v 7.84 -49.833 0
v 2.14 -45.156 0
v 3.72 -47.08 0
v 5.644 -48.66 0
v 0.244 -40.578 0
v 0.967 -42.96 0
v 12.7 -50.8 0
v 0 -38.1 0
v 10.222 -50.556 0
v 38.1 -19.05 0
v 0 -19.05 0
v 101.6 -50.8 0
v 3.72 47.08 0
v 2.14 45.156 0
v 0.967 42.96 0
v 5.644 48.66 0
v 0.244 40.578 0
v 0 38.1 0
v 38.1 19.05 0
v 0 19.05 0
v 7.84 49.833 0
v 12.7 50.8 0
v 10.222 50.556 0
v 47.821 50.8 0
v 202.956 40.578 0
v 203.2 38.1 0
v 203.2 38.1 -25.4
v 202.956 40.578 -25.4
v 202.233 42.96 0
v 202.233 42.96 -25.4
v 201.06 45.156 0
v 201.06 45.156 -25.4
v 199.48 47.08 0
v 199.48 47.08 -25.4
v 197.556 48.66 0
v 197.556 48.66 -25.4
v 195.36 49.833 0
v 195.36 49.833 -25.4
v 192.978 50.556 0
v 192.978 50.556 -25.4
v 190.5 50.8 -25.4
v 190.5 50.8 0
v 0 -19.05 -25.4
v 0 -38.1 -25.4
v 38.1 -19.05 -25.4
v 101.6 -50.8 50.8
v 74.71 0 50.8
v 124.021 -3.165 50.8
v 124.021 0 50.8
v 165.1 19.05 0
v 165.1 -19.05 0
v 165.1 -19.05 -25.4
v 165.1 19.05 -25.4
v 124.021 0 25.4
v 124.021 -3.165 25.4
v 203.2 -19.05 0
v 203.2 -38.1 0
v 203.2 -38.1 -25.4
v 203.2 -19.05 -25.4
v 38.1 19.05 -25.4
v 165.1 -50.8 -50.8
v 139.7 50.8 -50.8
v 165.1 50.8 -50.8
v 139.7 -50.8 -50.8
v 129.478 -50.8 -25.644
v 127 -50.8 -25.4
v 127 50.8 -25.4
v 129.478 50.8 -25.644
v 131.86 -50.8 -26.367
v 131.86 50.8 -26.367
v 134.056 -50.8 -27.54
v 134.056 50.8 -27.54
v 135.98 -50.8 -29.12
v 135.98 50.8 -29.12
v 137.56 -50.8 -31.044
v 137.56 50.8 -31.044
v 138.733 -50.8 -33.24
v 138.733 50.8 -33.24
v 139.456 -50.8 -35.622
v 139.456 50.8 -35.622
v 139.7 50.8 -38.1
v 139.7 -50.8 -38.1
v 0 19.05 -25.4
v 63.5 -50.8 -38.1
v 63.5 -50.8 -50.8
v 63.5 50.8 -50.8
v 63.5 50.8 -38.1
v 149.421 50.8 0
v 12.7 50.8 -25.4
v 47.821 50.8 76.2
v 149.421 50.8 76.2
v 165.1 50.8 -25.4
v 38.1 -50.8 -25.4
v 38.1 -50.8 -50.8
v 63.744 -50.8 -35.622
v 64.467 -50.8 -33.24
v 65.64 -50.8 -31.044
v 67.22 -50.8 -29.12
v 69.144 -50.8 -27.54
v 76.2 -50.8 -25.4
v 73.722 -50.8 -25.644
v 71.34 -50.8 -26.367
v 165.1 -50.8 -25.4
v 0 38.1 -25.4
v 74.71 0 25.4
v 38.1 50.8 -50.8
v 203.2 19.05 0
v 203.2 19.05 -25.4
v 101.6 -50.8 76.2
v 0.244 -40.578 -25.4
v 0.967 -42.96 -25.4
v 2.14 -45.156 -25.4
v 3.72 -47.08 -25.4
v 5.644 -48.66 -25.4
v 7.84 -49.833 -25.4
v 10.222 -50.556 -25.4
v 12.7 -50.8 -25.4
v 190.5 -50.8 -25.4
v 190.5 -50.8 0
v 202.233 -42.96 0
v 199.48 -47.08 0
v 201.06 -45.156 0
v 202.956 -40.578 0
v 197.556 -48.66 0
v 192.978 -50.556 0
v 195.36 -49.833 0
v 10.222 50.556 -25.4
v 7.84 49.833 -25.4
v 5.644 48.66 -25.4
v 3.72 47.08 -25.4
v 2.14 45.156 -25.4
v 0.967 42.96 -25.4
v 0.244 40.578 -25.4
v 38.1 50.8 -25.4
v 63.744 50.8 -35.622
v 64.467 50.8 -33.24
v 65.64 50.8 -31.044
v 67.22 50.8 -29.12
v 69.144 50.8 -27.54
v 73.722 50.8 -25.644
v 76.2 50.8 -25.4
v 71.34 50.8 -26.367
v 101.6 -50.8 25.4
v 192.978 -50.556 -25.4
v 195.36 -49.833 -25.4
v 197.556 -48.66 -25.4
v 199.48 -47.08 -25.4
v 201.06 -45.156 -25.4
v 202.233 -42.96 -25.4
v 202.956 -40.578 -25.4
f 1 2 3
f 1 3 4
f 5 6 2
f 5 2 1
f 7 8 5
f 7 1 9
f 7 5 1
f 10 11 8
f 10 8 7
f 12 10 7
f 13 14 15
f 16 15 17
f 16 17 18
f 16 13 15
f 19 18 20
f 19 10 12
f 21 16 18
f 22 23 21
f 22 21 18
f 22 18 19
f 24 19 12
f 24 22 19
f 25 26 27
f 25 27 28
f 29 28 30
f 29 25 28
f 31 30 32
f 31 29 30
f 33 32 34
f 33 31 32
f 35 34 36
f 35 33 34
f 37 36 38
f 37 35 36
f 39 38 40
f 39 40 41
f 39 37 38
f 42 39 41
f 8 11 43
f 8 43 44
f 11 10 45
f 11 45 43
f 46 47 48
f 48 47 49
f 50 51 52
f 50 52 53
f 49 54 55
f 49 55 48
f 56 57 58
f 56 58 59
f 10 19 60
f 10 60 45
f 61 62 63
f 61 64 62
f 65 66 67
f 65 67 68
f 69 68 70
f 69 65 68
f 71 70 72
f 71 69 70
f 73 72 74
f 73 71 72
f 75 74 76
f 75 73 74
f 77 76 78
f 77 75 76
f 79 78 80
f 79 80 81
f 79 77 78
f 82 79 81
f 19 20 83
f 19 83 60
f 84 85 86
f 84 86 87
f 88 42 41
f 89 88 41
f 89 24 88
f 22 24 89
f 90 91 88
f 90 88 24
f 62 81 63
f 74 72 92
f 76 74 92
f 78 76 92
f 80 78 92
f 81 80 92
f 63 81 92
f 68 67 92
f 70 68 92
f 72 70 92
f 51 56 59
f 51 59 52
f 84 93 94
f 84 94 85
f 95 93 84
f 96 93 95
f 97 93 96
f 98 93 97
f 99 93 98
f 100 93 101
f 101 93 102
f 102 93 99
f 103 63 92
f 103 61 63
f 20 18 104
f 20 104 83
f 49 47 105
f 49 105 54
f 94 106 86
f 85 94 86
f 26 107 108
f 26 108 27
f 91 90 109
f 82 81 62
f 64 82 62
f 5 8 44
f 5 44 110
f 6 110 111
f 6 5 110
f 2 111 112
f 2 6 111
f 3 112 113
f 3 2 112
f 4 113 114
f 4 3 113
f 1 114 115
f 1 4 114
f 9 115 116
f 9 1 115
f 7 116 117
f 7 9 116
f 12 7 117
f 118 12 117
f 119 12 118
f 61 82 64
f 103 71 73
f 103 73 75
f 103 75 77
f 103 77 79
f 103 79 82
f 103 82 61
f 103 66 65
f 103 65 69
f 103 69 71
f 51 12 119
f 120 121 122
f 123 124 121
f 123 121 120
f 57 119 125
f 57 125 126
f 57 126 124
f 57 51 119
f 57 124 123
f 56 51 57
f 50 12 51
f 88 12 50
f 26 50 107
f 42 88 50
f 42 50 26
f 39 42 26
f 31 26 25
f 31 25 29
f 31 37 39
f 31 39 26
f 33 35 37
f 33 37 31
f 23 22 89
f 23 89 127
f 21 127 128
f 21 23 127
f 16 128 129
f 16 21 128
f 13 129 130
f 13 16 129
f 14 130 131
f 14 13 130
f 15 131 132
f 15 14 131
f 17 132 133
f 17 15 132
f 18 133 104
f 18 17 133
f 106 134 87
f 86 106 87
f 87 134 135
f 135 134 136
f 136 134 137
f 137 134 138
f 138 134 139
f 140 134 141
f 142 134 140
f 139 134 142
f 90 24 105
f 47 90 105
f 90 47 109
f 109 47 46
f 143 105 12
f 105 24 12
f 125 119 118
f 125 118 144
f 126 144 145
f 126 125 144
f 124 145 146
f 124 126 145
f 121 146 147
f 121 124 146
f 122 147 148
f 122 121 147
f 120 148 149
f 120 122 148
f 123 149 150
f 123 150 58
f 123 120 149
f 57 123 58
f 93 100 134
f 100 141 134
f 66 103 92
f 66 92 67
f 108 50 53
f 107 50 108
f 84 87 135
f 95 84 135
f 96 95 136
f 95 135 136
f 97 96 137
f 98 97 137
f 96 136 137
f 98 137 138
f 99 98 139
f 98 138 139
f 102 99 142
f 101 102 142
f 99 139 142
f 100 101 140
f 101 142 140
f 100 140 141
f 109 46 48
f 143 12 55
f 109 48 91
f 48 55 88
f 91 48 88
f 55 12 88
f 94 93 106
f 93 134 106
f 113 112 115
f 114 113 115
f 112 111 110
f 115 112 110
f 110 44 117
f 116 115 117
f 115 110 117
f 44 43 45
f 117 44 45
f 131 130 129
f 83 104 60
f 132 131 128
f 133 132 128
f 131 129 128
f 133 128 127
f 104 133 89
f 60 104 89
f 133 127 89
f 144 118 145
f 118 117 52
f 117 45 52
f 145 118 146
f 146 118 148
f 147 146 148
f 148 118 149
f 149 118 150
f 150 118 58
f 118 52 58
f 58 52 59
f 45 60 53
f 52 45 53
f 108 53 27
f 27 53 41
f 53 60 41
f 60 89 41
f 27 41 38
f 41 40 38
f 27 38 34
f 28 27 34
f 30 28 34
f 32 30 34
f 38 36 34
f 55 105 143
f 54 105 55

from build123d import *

# Parameters (mm, degrees)
F1_DEPTH = 50.8
F2_W     = 38.1
F2_H     = 25.4
F3_DEPTH = 19.05
F5_DEPTH = 25.4
F7_DEPTH = 76.2
F8_W     = 50.8
F8_H     = 25.4
F9_DEPTH = 50.801


with BuildPart() as f1:
    # F0 (on Front) → F1 (new body, symmetric)
    with BuildSketch(Plane.XZ):
        with BuildLine():
            ThreePointArc((63.5, -38.1), (67.219744, -29.119744), (76.2, -25.4))
            Line((76.2, -25.4), (38.1, -25.4))
            Line((38.1, -25.4), (38.1, -50.8))
            Line((38.1, -50.8), (63.5, -50.8))
            Line((63.5, -50.8), (63.5, -38.1))
        make_face()
        with BuildLine():
            Line((165.1, -50.8), (165.1, -25.4))
            Line((165.1, -25.4), (127, -25.4))
            ThreePointArc((127, -25.4), (135.980256, -29.119744), (139.7, -38.1))
            Line((139.7, -38.1), (139.7, -50.8))
            Line((139.7, -50.8), (165.1, -50.8))
        make_face()
    extrude(amount=F1_DEPTH, both=True)

    # F2 (on Front) → F3 (cut, symmetric)
    with BuildSketch(Plane.XZ):
        with Locations((19.05, -12.7)):
            Rectangle(F2_W, F2_H)
        with Locations((184.15, -12.7)):
            Rectangle(F2_W, F2_H)
    extrude(amount=F3_DEPTH, both=True, mode=Mode.SUBTRACT)


with BuildPart() as f5:
    # F4 (on Top) → F5 (new body)
    with BuildSketch(Plane.XY):
        with BuildLine():
            ThreePointArc((0, -38.1), (3.719744, -47.080256), (12.7, -50.8))
            Line((12.7, -50.8), (190.5, -50.8))
            ThreePointArc((190.5, -50.8), (199.480256, -47.080256), (203.2, -38.1))
            Line((203.2, -38.1), (203.2, -19.05))
            Line((203.2, -19.05), (165.1, -19.05))
            Line((165.1, -19.05), (165.1, 19.05))
            Line((165.1, 19.05), (203.2, 19.05))
            Line((203.2, 19.05), (203.2, 38.1))
            ThreePointArc((203.2, 38.1), (199.480256, 47.080256), (190.5, 50.8))
            Line((190.5, 50.8), (12.7, 50.8))
            ThreePointArc((12.7, 50.8), (3.719744, 47.080256), (0, 38.1))
            Line((0, 38.1), (0, 19.05))
            Line((0, 19.05), (38.1, 19.05))
            Line((38.1, 19.05), (38.1, -19.05))
            Line((38.1, -19.05), (0, -19.05))
            Line((0, -19.05), (0, -38.1))
        make_face()
    extrude(amount=-F5_DEPTH)

    # F6 (on Top) → F7 (join)
    with BuildSketch(Plane.XY):
        Polygon((149.420515, 50.8), (47.820515, 50.8), (101.6, -50.8), align=None)
    extrude(amount=F7_DEPTH)

    # F8 (on Front) → F9 (cut, through all)
    with BuildSketch(Plane.XZ):
        with Locations((98.620515, 38.1)):
            Rectangle(F8_W, F8_H)
    extrude(amount=F9_DEPTH, mode=Mode.SUBTRACT)


solid = Compound([f1.part, f5.part])
